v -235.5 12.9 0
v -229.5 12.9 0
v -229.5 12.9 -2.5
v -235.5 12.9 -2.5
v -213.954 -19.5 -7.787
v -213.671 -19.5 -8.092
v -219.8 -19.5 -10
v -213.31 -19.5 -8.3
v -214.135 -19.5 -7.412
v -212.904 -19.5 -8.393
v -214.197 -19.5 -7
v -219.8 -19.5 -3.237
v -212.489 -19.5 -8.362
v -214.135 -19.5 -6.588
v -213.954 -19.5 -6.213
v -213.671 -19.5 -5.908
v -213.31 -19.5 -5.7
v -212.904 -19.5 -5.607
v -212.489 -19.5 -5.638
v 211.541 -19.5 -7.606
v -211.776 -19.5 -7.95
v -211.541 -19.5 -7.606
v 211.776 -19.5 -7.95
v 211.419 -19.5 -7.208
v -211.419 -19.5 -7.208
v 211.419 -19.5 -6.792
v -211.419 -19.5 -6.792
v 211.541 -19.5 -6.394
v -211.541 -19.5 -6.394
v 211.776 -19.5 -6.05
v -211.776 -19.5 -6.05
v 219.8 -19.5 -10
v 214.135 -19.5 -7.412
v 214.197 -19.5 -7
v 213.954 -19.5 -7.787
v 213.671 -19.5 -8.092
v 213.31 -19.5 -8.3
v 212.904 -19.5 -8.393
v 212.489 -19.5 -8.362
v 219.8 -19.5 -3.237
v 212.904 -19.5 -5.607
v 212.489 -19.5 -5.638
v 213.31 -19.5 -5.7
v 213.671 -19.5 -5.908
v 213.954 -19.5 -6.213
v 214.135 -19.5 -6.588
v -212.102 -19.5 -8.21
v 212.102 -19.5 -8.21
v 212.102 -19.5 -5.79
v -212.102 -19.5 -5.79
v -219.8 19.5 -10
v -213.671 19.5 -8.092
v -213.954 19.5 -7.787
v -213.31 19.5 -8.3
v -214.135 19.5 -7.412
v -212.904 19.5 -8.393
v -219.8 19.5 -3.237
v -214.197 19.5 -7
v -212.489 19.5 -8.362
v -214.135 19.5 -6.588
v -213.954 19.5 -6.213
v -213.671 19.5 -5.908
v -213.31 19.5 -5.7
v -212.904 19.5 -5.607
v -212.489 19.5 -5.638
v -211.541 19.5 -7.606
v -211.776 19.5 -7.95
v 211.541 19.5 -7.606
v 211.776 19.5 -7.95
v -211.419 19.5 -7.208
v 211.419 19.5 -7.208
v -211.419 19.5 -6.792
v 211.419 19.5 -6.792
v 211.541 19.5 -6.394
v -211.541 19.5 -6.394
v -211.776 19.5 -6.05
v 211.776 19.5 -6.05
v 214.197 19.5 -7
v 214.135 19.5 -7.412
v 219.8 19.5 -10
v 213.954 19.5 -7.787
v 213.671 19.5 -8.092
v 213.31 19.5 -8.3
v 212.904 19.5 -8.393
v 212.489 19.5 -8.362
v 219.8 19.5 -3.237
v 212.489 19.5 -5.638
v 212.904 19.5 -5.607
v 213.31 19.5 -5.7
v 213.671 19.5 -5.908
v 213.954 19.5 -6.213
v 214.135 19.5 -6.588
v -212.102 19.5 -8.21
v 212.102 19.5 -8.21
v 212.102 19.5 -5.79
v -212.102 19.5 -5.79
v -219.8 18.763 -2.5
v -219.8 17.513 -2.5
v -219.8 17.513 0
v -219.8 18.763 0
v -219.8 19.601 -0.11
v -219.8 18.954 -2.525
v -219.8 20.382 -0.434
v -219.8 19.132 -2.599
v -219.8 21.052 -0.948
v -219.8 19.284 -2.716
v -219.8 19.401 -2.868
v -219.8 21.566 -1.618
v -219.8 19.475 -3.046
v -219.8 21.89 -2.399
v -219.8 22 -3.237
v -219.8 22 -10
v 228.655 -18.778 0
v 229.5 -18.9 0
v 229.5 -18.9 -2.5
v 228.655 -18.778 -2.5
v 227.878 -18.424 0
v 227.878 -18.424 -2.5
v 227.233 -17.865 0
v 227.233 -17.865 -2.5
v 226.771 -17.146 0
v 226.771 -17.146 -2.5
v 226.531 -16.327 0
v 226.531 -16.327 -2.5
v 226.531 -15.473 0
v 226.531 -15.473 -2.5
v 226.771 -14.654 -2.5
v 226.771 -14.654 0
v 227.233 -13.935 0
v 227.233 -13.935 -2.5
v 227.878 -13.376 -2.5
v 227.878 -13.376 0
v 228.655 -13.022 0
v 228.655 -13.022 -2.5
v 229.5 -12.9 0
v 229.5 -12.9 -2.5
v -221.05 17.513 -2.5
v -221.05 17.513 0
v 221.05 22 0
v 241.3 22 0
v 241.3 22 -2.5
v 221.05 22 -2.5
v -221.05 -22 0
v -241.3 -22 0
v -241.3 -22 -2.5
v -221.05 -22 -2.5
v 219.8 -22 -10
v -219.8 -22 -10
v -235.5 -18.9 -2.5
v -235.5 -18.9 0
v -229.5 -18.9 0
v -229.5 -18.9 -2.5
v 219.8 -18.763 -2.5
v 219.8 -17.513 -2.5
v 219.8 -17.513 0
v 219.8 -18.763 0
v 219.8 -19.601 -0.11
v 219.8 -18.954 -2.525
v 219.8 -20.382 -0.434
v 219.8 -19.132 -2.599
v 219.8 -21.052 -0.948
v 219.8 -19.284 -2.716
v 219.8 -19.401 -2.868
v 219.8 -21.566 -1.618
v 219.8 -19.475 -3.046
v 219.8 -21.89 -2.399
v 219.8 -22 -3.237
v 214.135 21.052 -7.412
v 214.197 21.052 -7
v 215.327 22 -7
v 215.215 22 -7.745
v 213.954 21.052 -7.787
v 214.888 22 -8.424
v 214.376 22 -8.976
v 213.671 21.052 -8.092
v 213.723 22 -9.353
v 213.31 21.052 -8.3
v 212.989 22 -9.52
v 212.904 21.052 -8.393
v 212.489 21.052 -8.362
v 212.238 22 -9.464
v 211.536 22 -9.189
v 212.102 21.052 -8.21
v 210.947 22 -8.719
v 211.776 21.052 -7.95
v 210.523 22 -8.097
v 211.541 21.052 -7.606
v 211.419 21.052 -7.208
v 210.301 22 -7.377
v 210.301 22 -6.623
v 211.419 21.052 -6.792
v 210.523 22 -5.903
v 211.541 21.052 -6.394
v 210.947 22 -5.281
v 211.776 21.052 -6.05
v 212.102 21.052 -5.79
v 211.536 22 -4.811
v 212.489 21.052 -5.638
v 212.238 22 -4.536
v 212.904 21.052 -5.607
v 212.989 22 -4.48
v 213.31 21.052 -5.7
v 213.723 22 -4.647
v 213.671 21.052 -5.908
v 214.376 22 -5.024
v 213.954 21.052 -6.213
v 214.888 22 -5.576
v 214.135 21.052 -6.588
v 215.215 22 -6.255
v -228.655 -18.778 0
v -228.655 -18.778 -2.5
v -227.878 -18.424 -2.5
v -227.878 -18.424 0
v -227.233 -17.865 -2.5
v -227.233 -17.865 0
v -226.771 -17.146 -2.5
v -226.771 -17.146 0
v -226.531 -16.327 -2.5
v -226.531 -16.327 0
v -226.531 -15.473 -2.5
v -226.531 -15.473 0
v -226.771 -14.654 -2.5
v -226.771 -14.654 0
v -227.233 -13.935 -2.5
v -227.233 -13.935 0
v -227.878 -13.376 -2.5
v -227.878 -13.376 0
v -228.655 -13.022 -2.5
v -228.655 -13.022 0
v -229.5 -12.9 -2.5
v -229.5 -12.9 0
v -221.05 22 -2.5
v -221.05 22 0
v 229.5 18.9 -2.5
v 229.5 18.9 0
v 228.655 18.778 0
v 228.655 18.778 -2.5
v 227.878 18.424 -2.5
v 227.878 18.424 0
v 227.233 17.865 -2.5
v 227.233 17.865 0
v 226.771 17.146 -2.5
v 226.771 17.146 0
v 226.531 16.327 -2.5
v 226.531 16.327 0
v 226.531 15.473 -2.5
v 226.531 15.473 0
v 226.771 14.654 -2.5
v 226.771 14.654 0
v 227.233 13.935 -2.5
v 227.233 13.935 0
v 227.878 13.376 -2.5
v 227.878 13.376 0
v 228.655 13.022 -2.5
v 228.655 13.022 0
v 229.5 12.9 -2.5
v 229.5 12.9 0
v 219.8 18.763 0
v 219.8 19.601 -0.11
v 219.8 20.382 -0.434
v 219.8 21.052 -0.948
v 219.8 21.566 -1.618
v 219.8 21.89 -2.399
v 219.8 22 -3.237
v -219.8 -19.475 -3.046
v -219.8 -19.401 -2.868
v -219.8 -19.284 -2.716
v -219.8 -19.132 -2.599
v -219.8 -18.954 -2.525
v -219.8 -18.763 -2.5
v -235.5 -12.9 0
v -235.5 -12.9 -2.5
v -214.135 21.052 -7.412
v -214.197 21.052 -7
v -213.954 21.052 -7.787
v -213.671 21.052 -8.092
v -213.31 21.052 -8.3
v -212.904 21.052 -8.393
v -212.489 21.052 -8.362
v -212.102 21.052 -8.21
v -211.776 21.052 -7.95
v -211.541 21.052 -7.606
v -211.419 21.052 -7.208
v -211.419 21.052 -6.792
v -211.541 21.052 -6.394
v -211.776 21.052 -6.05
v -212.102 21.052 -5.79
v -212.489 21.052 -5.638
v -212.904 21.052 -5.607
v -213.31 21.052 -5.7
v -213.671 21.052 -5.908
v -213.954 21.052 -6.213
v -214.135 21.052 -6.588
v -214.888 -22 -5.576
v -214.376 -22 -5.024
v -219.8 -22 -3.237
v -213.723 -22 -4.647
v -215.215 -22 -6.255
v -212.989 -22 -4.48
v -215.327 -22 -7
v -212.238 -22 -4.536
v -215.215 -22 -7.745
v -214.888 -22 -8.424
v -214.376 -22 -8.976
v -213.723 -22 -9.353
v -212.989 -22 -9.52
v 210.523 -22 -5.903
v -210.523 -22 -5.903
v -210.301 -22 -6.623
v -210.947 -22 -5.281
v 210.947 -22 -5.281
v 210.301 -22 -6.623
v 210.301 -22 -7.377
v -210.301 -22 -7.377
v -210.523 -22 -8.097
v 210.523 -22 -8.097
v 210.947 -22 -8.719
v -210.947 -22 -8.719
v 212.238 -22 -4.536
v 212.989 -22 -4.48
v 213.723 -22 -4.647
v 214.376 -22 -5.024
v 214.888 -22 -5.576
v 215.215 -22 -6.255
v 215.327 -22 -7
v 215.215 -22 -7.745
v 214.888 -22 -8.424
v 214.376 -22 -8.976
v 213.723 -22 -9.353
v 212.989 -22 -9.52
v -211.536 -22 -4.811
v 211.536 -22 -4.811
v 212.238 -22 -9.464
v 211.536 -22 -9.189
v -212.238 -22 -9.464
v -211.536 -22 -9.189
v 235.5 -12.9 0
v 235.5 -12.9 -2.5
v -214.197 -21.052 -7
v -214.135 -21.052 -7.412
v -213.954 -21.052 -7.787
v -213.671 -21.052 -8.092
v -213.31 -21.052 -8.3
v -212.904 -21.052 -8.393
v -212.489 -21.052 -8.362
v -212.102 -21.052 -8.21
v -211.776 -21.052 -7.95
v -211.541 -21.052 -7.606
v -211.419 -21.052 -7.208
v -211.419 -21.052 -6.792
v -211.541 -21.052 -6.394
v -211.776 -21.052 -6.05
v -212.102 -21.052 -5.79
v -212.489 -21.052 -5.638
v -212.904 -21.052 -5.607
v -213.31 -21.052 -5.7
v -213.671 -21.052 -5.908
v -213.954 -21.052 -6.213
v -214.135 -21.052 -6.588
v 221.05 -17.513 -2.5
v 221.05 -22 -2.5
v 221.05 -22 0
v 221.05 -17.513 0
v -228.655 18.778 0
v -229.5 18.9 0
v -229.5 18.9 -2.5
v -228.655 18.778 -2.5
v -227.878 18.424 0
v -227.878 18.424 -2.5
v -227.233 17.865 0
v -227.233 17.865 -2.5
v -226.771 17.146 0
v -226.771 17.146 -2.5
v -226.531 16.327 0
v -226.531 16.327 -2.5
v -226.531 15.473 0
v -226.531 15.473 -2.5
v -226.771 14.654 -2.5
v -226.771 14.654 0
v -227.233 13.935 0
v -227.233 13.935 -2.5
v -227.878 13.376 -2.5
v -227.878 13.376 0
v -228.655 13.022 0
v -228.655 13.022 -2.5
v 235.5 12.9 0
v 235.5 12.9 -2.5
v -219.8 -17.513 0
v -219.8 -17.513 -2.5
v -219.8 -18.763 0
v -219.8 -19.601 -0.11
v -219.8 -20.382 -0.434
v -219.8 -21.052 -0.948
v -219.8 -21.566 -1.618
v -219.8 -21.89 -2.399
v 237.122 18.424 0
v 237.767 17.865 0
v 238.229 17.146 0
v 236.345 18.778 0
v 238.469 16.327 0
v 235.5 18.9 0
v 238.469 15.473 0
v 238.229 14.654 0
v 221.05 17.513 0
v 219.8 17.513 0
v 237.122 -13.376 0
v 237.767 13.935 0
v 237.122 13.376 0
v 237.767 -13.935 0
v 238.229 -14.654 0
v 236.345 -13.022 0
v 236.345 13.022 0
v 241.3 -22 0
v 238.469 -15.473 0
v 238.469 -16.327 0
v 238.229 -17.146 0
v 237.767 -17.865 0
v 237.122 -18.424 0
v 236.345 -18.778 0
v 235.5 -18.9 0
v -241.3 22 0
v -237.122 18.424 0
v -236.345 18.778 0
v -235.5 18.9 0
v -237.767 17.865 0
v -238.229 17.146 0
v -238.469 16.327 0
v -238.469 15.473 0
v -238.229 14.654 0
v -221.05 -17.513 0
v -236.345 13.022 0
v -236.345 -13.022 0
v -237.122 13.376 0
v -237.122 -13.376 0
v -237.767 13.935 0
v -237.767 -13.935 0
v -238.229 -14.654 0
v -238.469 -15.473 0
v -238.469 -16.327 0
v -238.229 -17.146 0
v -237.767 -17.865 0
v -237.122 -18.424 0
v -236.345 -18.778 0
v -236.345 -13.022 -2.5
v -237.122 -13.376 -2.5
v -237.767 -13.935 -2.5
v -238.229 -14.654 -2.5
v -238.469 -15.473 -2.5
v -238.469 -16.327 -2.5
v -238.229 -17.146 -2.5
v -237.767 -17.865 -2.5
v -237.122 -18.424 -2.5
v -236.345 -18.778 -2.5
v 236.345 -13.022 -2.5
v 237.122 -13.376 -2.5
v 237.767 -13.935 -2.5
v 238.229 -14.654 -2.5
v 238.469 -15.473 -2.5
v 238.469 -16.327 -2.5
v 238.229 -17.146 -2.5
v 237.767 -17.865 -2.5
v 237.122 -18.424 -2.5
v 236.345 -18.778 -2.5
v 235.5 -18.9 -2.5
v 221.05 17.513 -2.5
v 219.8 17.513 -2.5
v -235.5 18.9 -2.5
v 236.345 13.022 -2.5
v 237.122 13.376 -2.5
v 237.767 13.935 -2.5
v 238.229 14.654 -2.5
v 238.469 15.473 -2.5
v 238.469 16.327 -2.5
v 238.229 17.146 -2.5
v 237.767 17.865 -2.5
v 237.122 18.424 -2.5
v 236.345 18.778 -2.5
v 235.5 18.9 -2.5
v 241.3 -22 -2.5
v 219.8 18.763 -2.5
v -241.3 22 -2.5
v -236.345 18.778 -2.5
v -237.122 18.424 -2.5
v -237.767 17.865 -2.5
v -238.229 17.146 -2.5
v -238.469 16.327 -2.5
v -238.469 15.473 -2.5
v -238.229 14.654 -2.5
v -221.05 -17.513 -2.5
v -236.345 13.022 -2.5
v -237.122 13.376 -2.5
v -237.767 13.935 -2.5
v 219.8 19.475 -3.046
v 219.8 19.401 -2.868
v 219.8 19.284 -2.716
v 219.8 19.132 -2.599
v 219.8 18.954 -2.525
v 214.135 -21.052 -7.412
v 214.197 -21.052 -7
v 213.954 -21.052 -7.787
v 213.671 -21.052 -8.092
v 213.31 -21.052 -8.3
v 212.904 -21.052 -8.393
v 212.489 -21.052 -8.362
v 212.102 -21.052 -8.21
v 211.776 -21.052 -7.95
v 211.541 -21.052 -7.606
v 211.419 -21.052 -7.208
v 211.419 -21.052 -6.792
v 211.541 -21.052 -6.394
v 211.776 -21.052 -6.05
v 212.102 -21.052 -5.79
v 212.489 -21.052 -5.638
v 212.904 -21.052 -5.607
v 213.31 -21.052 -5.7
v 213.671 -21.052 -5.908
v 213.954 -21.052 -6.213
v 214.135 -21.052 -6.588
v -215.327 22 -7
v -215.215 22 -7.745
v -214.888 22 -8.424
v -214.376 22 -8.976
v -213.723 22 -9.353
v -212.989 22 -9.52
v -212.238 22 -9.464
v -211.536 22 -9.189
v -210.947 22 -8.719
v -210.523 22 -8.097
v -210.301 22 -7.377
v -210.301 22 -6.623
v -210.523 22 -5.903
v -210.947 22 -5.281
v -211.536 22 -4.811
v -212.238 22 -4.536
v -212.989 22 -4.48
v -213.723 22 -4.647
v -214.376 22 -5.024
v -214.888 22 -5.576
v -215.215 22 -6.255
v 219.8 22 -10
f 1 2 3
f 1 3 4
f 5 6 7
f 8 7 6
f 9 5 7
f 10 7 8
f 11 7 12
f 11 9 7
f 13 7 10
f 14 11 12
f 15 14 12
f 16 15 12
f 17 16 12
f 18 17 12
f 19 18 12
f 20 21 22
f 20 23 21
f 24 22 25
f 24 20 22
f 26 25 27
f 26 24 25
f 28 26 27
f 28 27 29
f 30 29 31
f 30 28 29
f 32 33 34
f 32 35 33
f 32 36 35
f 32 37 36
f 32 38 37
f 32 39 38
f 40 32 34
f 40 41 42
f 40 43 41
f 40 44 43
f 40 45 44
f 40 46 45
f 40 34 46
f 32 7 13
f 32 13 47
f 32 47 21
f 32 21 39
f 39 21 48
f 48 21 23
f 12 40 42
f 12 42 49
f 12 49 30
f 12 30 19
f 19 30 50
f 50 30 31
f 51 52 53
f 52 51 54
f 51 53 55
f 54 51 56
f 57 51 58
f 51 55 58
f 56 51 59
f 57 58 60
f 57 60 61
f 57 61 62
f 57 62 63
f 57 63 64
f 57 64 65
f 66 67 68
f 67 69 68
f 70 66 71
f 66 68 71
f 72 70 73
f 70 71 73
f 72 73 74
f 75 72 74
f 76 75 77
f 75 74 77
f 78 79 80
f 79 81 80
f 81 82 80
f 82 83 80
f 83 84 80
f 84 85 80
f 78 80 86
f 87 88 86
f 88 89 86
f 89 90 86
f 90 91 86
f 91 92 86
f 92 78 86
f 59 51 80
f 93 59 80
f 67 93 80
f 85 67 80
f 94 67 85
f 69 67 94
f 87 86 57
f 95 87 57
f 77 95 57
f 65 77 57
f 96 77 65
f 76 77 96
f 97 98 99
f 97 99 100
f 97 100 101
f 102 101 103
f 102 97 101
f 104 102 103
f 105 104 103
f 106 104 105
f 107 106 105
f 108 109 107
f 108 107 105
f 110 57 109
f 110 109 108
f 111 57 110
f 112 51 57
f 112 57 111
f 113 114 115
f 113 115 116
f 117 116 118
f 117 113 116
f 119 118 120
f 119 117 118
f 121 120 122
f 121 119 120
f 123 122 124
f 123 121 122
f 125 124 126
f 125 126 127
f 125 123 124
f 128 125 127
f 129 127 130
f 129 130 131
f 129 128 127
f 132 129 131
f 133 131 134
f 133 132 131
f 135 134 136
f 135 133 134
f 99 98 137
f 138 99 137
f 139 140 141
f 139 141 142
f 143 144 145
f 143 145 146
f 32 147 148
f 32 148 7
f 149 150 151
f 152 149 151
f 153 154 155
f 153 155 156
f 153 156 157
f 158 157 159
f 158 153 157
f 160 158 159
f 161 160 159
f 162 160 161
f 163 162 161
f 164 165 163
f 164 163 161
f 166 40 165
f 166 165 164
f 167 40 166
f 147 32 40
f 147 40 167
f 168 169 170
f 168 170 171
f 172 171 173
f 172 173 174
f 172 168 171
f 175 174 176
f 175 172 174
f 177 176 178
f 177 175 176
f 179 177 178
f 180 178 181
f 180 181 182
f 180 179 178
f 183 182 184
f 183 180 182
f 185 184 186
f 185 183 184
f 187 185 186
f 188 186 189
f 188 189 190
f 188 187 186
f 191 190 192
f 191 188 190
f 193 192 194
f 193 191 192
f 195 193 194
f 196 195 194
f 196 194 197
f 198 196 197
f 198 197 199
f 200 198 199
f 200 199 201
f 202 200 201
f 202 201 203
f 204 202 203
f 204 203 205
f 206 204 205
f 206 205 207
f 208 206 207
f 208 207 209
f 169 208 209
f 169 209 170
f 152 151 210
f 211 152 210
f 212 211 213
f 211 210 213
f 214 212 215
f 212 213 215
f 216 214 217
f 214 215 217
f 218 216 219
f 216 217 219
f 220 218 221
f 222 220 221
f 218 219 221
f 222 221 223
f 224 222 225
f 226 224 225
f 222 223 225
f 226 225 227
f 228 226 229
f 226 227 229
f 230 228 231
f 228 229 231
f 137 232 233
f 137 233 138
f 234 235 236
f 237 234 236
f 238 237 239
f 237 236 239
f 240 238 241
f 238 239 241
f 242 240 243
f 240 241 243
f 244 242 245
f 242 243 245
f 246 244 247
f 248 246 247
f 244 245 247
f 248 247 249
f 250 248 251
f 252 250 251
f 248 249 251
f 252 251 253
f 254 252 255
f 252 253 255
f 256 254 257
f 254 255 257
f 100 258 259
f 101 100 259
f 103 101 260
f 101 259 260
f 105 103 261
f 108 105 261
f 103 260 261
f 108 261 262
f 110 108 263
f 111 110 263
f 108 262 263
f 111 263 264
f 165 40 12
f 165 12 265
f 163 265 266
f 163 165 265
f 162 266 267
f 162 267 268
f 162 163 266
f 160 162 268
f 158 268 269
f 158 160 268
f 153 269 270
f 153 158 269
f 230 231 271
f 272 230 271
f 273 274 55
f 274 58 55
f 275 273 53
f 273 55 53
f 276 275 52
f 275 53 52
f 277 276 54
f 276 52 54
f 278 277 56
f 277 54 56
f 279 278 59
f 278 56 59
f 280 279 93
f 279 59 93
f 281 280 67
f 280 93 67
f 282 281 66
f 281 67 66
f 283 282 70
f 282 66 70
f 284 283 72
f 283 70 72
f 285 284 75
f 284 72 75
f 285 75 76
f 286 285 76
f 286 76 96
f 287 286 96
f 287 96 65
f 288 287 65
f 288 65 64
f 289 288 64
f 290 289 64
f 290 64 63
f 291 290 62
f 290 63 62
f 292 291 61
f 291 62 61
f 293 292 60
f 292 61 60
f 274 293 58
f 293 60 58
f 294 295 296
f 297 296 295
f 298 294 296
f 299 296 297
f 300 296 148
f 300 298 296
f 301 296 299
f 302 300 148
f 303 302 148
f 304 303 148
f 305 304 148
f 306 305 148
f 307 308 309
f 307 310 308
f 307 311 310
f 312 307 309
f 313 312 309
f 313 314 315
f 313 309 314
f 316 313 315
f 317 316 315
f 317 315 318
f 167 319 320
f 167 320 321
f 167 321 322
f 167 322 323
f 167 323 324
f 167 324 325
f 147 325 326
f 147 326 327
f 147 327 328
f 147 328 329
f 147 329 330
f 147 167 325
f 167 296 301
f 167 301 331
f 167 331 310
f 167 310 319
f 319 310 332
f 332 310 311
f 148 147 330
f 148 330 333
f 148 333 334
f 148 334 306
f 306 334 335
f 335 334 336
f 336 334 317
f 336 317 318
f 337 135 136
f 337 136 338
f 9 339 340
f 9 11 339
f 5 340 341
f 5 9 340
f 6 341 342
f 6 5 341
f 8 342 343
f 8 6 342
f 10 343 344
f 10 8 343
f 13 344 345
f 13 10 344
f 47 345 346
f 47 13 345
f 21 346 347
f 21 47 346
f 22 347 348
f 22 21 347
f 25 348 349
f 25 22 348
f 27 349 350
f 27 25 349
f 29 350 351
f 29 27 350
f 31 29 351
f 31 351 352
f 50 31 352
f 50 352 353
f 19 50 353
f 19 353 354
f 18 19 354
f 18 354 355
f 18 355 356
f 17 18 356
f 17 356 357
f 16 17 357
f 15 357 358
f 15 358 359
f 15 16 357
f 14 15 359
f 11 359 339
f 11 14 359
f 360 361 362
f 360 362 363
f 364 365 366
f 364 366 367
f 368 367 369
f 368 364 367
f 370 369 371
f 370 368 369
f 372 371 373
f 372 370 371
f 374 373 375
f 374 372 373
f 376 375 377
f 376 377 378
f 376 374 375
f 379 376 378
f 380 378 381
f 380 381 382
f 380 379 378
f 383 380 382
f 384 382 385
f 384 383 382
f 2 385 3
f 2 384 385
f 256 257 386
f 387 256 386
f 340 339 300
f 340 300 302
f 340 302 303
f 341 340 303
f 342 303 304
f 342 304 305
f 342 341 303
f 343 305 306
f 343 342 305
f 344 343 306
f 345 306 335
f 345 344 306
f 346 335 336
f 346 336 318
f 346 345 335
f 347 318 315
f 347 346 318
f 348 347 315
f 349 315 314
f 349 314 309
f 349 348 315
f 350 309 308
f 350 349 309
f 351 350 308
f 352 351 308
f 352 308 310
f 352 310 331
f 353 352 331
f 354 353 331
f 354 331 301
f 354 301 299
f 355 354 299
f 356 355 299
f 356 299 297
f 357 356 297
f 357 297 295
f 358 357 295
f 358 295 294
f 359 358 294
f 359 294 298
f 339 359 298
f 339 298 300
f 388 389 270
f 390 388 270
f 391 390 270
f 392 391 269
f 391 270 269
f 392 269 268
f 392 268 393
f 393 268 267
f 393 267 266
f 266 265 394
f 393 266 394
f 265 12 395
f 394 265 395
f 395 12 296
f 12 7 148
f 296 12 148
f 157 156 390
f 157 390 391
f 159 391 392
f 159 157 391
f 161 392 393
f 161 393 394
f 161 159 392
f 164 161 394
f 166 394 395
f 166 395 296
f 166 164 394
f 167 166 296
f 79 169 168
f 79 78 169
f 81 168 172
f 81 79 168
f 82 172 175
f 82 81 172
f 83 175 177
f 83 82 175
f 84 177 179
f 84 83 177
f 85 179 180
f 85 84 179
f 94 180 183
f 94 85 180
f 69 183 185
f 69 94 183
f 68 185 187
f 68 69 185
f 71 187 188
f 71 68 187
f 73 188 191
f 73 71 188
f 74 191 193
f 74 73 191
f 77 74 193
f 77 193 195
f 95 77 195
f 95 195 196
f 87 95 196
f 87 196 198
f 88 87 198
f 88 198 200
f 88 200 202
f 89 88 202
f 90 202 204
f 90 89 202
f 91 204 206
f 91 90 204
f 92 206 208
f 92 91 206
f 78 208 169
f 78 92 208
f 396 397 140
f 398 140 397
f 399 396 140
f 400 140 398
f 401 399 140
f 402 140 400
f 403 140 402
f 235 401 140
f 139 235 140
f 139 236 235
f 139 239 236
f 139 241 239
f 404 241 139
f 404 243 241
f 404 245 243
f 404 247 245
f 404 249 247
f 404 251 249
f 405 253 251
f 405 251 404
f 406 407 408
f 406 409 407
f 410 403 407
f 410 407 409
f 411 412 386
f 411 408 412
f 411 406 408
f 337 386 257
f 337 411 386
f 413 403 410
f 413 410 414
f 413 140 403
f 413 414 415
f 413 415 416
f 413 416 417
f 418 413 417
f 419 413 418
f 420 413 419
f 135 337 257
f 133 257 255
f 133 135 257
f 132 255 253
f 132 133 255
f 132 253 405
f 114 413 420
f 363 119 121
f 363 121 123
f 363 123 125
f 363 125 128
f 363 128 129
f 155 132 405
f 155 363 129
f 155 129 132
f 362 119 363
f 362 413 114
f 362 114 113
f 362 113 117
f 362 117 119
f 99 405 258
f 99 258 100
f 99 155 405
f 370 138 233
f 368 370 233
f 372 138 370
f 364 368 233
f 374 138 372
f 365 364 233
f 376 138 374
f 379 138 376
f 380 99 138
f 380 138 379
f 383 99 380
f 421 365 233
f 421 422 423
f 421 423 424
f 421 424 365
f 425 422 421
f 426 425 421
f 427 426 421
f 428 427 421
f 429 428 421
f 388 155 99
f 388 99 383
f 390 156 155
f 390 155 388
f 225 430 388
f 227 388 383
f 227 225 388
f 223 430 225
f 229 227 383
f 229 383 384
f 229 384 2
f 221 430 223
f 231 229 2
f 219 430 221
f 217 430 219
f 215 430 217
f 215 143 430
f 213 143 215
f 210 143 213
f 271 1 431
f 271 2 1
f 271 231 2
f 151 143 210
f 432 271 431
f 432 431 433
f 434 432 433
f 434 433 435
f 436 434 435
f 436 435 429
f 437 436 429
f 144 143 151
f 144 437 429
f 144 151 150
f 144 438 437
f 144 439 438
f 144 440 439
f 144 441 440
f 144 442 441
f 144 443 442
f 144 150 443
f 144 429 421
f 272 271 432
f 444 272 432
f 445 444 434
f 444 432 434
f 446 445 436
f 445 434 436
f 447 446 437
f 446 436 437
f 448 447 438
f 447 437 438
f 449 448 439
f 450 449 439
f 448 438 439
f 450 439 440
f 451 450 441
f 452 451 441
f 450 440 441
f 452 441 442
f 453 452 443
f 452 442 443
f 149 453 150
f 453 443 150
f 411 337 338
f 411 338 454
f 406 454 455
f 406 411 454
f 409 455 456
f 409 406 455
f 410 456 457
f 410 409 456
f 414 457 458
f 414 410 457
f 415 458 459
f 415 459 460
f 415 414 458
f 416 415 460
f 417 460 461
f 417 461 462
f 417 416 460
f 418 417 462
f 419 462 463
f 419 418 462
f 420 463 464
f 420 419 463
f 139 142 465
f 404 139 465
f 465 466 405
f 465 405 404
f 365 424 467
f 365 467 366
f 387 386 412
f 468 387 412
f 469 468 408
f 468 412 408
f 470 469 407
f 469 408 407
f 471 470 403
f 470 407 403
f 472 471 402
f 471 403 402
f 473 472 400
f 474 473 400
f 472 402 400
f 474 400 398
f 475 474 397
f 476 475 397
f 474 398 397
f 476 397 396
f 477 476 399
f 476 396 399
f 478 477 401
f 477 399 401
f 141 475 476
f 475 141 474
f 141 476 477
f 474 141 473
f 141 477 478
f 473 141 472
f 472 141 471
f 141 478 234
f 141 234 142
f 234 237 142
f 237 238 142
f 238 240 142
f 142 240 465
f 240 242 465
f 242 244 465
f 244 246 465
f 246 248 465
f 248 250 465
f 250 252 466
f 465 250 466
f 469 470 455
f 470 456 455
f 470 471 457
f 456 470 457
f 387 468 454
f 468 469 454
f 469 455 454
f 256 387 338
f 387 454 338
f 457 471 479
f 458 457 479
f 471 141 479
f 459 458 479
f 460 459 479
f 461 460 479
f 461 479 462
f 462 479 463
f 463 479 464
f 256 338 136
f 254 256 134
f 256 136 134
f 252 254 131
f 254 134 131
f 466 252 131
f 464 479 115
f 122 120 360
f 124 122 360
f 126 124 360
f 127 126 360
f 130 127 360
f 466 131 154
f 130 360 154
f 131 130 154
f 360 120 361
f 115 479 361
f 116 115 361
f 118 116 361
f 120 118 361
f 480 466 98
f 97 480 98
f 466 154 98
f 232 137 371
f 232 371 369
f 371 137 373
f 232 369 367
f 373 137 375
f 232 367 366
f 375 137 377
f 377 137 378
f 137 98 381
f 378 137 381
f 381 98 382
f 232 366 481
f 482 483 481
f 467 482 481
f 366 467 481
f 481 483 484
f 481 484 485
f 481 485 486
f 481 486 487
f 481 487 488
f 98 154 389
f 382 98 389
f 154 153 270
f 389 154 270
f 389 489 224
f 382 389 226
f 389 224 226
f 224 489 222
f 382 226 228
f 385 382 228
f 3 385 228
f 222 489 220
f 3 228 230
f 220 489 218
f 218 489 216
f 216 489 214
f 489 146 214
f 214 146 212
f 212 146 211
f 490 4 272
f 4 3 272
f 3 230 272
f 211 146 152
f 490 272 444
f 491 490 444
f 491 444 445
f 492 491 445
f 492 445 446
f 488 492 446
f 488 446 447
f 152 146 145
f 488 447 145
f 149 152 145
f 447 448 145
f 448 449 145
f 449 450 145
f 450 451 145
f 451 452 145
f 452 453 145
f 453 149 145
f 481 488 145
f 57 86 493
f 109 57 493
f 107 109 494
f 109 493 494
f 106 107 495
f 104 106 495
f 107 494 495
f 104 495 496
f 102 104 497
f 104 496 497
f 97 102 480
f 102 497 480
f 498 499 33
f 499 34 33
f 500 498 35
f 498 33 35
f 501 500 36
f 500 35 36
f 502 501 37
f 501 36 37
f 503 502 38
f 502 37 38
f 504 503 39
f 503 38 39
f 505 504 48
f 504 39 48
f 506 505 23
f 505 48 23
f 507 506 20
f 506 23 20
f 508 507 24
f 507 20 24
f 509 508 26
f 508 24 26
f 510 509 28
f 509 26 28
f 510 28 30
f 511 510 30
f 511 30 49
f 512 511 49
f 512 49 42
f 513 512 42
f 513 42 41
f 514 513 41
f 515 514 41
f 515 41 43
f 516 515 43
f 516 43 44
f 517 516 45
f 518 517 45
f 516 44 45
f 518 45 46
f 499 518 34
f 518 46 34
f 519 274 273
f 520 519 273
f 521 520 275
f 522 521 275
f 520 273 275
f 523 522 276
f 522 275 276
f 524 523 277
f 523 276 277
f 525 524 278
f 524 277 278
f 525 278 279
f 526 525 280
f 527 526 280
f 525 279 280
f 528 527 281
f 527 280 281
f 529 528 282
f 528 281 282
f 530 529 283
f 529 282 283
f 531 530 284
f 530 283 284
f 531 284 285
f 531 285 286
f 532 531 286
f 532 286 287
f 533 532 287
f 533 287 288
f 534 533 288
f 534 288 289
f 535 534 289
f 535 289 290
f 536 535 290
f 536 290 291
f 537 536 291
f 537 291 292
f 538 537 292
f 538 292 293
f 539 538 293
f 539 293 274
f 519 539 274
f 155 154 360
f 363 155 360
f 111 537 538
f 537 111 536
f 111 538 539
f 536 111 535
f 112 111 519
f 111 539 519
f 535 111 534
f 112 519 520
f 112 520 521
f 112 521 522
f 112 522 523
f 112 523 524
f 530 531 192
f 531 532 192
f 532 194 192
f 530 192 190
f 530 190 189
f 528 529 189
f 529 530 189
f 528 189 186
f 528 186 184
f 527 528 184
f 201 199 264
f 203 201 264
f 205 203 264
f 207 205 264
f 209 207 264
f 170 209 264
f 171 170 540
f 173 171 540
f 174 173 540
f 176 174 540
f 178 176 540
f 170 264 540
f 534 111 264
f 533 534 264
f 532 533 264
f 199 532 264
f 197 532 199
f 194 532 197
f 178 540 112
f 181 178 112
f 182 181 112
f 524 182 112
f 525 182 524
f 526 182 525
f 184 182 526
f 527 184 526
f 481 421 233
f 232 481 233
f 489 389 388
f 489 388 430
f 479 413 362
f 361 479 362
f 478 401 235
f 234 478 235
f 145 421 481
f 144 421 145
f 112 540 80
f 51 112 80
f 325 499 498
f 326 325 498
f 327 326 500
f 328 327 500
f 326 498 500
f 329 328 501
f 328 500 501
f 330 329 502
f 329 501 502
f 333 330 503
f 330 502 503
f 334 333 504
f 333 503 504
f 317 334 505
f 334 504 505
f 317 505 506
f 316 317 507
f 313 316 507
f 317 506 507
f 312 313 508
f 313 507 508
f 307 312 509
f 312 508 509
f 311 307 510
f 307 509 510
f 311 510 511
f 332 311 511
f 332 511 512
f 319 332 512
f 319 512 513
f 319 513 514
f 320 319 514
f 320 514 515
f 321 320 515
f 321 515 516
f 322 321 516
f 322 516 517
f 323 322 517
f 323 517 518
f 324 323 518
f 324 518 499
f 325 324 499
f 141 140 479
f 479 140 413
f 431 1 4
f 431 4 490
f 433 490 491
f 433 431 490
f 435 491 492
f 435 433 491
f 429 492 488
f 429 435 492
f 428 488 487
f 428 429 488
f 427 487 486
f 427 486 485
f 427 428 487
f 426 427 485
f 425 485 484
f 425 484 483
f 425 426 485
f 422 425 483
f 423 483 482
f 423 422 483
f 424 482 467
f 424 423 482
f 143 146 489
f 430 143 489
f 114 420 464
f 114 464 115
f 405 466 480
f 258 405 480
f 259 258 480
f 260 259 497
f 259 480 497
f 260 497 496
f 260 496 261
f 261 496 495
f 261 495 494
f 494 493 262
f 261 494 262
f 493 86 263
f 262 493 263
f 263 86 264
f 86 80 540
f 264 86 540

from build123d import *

# Parameters (mm, degrees)
SKETCH1_W                                         = 241.3
SKETCH1_H                                         = 22
BASE_FLANGE_DEPTH                                 = 2.5
EDGE_FLANGE_MOUNING_STRIP_W                       = 11.4732
EDGE_FLANGE_MOUNING_STRIP_H                       = 2.5
EDGE_FLANGE_MOUNING_STRIP_CUT_DEPTH               = 219.8
EDGE_FLANGE_MOUNING_RELIEF_W                      = 12.7232
EDGE_FLANGE_MOUNING_RELIEF_H                      = 1.25
EDGE_FLANGE_MOUNING_RELIEF_CUT_DEPTH              = 2.5
EDGE_FLANGE_MOUNING_DEPTH                         = 219.8
CUT_EXTRUDE_MOUNTING_DEPTH                        = 2.5
CSK_FOR_3_FLAT_HEAD_MACHINE_SCREW_100_D           = 2.794
CSK_FOR_3_FLAT_HEAD_MACHINE_SCREW_100_CSINK_D     = 5.0546
CSK_FOR_3_FLAT_HEAD_MACHINE_SCREW_100_CSINK_ANGLE = 100


# Sheet-metal steps are written as plain solids
with BuildPart() as part:
    # Sketch1 → Base-Flange (new body)
    with BuildSketch(Plane.XY):
        with Locations((-120.65, 11)):
            Rectangle(SKETCH1_W, SKETCH1_H)
    extrude(amount=-BASE_FLANGE_DEPTH)

    # Edge-Flange-Mouning strip (across the edge) → Edge-Flange-Mouning strip cut (cut)
    with BuildSketch(Plane(origin=(-219.8, 22, -2.5), x_dir=(0, -1, 0), z_dir=(1, 0, 0))):
        with Locations((-2.5, -1.25)):
            Rectangle(EDGE_FLANGE_MOUNING_STRIP_W, EDGE_FLANGE_MOUNING_STRIP_H)
    extrude(amount=EDGE_FLANGE_MOUNING_STRIP_CUT_DEPTH, mode=Mode.SUBTRACT)

    # Edge-Flange-Mouning relief (on the sheet) → Edge-Flange-Mouning relief cut (cut)
    with BuildSketch(Plane(origin=(-219.8, 18.7634, -2.5), x_dir=(0, -1, 0), z_dir=(0, 0, -1))):
        with Locations((-5.1116, 0.625)):
            Rectangle(EDGE_FLANGE_MOUNING_RELIEF_W, EDGE_FLANGE_MOUNING_RELIEF_H)
    extrude(amount=-EDGE_FLANGE_MOUNING_RELIEF_CUT_DEPTH, mode=Mode.SUBTRACT)

    # Edge-Flange-Mouning section (across the edge) → Edge-Flange-Mouning (add)
    with BuildSketch(Plane(origin=(-219.8, 22, -2.5), x_dir=(0, -1, 0), z_dir=(1, 0, 0))):
        with BuildLine():
            Line((0, 0.7366), (0, 7.5))
            Line((0, 7.5), (2.5, 7.5))
            Line((2.5, 7.5), (2.5, 0.7366))
            ThreePointArc((2.5, 0.7366), (2.715745145, 0.215745145), (3.2366, 0))
            Line((3.2366, 0), (3.2366, -2.5))
            ThreePointArc((3.2366, -2.5), (0.947978192, -1.552021808), (0, 0.7366))
        make_face()
    extrude(amount=EDGE_FLANGE_MOUNING_DEPTH)

    # Sketch13 → Cut-Extrude-Mounting (cut)
    with BuildSketch(Plane.XY):
        with BuildLine():
            Line((-229.5, 12.9), (-235.5, 12.9))
            ThreePointArc((-235.5, 12.9), (-238.5, 15.9), (-235.5, 18.9))
            Line((-235.5, 18.9), (-229.5, 18.9))
            ThreePointArc((-229.5, 18.9), (-226.5, 15.9), (-229.5, 12.9))
        make_face()
    extrude(amount=-CUT_EXTRUDE_MOUNTING_DEPTH, mode=Mode.SUBTRACT)

    # CSK for #3 Flat Head Machine Screw (100)1 (through all)
    with Locations(Plane(origin=(0, 22, 0), x_dir=(1, 0, 0), z_dir=(0, 1, 0))):
        with Locations((-212.8, 7)):
            CounterSinkHole(CSK_FOR_3_FLAT_HEAD_MACHINE_SCREW_100_D / 2, CSK_FOR_3_FLAT_HEAD_MACHINE_SCREW_100_CSINK_D / 2, counter_sink_angle=CSK_FOR_3_FLAT_HEAD_MACHINE_SCREW_100_CSINK_ANGLE)

    # Mirror-Vertical: part across plane


with BuildPart() as part_1:
    add(part.part)
    add(part.part.mirror(Plane(origin=(0, 0, -2.5), x_dir=(0, 0, 1), z_dir=(1, 0, 0))))

    # Mirror-Horizontal: part across face


with BuildPart() as part_2:
    add(part_1.part)
    add(part_1.part.mirror(Plane(origin=(0, 0, -1.25), x_dir=(0, 0, 1), z_dir=(0, -1, 0))))


solid = part_2.part
